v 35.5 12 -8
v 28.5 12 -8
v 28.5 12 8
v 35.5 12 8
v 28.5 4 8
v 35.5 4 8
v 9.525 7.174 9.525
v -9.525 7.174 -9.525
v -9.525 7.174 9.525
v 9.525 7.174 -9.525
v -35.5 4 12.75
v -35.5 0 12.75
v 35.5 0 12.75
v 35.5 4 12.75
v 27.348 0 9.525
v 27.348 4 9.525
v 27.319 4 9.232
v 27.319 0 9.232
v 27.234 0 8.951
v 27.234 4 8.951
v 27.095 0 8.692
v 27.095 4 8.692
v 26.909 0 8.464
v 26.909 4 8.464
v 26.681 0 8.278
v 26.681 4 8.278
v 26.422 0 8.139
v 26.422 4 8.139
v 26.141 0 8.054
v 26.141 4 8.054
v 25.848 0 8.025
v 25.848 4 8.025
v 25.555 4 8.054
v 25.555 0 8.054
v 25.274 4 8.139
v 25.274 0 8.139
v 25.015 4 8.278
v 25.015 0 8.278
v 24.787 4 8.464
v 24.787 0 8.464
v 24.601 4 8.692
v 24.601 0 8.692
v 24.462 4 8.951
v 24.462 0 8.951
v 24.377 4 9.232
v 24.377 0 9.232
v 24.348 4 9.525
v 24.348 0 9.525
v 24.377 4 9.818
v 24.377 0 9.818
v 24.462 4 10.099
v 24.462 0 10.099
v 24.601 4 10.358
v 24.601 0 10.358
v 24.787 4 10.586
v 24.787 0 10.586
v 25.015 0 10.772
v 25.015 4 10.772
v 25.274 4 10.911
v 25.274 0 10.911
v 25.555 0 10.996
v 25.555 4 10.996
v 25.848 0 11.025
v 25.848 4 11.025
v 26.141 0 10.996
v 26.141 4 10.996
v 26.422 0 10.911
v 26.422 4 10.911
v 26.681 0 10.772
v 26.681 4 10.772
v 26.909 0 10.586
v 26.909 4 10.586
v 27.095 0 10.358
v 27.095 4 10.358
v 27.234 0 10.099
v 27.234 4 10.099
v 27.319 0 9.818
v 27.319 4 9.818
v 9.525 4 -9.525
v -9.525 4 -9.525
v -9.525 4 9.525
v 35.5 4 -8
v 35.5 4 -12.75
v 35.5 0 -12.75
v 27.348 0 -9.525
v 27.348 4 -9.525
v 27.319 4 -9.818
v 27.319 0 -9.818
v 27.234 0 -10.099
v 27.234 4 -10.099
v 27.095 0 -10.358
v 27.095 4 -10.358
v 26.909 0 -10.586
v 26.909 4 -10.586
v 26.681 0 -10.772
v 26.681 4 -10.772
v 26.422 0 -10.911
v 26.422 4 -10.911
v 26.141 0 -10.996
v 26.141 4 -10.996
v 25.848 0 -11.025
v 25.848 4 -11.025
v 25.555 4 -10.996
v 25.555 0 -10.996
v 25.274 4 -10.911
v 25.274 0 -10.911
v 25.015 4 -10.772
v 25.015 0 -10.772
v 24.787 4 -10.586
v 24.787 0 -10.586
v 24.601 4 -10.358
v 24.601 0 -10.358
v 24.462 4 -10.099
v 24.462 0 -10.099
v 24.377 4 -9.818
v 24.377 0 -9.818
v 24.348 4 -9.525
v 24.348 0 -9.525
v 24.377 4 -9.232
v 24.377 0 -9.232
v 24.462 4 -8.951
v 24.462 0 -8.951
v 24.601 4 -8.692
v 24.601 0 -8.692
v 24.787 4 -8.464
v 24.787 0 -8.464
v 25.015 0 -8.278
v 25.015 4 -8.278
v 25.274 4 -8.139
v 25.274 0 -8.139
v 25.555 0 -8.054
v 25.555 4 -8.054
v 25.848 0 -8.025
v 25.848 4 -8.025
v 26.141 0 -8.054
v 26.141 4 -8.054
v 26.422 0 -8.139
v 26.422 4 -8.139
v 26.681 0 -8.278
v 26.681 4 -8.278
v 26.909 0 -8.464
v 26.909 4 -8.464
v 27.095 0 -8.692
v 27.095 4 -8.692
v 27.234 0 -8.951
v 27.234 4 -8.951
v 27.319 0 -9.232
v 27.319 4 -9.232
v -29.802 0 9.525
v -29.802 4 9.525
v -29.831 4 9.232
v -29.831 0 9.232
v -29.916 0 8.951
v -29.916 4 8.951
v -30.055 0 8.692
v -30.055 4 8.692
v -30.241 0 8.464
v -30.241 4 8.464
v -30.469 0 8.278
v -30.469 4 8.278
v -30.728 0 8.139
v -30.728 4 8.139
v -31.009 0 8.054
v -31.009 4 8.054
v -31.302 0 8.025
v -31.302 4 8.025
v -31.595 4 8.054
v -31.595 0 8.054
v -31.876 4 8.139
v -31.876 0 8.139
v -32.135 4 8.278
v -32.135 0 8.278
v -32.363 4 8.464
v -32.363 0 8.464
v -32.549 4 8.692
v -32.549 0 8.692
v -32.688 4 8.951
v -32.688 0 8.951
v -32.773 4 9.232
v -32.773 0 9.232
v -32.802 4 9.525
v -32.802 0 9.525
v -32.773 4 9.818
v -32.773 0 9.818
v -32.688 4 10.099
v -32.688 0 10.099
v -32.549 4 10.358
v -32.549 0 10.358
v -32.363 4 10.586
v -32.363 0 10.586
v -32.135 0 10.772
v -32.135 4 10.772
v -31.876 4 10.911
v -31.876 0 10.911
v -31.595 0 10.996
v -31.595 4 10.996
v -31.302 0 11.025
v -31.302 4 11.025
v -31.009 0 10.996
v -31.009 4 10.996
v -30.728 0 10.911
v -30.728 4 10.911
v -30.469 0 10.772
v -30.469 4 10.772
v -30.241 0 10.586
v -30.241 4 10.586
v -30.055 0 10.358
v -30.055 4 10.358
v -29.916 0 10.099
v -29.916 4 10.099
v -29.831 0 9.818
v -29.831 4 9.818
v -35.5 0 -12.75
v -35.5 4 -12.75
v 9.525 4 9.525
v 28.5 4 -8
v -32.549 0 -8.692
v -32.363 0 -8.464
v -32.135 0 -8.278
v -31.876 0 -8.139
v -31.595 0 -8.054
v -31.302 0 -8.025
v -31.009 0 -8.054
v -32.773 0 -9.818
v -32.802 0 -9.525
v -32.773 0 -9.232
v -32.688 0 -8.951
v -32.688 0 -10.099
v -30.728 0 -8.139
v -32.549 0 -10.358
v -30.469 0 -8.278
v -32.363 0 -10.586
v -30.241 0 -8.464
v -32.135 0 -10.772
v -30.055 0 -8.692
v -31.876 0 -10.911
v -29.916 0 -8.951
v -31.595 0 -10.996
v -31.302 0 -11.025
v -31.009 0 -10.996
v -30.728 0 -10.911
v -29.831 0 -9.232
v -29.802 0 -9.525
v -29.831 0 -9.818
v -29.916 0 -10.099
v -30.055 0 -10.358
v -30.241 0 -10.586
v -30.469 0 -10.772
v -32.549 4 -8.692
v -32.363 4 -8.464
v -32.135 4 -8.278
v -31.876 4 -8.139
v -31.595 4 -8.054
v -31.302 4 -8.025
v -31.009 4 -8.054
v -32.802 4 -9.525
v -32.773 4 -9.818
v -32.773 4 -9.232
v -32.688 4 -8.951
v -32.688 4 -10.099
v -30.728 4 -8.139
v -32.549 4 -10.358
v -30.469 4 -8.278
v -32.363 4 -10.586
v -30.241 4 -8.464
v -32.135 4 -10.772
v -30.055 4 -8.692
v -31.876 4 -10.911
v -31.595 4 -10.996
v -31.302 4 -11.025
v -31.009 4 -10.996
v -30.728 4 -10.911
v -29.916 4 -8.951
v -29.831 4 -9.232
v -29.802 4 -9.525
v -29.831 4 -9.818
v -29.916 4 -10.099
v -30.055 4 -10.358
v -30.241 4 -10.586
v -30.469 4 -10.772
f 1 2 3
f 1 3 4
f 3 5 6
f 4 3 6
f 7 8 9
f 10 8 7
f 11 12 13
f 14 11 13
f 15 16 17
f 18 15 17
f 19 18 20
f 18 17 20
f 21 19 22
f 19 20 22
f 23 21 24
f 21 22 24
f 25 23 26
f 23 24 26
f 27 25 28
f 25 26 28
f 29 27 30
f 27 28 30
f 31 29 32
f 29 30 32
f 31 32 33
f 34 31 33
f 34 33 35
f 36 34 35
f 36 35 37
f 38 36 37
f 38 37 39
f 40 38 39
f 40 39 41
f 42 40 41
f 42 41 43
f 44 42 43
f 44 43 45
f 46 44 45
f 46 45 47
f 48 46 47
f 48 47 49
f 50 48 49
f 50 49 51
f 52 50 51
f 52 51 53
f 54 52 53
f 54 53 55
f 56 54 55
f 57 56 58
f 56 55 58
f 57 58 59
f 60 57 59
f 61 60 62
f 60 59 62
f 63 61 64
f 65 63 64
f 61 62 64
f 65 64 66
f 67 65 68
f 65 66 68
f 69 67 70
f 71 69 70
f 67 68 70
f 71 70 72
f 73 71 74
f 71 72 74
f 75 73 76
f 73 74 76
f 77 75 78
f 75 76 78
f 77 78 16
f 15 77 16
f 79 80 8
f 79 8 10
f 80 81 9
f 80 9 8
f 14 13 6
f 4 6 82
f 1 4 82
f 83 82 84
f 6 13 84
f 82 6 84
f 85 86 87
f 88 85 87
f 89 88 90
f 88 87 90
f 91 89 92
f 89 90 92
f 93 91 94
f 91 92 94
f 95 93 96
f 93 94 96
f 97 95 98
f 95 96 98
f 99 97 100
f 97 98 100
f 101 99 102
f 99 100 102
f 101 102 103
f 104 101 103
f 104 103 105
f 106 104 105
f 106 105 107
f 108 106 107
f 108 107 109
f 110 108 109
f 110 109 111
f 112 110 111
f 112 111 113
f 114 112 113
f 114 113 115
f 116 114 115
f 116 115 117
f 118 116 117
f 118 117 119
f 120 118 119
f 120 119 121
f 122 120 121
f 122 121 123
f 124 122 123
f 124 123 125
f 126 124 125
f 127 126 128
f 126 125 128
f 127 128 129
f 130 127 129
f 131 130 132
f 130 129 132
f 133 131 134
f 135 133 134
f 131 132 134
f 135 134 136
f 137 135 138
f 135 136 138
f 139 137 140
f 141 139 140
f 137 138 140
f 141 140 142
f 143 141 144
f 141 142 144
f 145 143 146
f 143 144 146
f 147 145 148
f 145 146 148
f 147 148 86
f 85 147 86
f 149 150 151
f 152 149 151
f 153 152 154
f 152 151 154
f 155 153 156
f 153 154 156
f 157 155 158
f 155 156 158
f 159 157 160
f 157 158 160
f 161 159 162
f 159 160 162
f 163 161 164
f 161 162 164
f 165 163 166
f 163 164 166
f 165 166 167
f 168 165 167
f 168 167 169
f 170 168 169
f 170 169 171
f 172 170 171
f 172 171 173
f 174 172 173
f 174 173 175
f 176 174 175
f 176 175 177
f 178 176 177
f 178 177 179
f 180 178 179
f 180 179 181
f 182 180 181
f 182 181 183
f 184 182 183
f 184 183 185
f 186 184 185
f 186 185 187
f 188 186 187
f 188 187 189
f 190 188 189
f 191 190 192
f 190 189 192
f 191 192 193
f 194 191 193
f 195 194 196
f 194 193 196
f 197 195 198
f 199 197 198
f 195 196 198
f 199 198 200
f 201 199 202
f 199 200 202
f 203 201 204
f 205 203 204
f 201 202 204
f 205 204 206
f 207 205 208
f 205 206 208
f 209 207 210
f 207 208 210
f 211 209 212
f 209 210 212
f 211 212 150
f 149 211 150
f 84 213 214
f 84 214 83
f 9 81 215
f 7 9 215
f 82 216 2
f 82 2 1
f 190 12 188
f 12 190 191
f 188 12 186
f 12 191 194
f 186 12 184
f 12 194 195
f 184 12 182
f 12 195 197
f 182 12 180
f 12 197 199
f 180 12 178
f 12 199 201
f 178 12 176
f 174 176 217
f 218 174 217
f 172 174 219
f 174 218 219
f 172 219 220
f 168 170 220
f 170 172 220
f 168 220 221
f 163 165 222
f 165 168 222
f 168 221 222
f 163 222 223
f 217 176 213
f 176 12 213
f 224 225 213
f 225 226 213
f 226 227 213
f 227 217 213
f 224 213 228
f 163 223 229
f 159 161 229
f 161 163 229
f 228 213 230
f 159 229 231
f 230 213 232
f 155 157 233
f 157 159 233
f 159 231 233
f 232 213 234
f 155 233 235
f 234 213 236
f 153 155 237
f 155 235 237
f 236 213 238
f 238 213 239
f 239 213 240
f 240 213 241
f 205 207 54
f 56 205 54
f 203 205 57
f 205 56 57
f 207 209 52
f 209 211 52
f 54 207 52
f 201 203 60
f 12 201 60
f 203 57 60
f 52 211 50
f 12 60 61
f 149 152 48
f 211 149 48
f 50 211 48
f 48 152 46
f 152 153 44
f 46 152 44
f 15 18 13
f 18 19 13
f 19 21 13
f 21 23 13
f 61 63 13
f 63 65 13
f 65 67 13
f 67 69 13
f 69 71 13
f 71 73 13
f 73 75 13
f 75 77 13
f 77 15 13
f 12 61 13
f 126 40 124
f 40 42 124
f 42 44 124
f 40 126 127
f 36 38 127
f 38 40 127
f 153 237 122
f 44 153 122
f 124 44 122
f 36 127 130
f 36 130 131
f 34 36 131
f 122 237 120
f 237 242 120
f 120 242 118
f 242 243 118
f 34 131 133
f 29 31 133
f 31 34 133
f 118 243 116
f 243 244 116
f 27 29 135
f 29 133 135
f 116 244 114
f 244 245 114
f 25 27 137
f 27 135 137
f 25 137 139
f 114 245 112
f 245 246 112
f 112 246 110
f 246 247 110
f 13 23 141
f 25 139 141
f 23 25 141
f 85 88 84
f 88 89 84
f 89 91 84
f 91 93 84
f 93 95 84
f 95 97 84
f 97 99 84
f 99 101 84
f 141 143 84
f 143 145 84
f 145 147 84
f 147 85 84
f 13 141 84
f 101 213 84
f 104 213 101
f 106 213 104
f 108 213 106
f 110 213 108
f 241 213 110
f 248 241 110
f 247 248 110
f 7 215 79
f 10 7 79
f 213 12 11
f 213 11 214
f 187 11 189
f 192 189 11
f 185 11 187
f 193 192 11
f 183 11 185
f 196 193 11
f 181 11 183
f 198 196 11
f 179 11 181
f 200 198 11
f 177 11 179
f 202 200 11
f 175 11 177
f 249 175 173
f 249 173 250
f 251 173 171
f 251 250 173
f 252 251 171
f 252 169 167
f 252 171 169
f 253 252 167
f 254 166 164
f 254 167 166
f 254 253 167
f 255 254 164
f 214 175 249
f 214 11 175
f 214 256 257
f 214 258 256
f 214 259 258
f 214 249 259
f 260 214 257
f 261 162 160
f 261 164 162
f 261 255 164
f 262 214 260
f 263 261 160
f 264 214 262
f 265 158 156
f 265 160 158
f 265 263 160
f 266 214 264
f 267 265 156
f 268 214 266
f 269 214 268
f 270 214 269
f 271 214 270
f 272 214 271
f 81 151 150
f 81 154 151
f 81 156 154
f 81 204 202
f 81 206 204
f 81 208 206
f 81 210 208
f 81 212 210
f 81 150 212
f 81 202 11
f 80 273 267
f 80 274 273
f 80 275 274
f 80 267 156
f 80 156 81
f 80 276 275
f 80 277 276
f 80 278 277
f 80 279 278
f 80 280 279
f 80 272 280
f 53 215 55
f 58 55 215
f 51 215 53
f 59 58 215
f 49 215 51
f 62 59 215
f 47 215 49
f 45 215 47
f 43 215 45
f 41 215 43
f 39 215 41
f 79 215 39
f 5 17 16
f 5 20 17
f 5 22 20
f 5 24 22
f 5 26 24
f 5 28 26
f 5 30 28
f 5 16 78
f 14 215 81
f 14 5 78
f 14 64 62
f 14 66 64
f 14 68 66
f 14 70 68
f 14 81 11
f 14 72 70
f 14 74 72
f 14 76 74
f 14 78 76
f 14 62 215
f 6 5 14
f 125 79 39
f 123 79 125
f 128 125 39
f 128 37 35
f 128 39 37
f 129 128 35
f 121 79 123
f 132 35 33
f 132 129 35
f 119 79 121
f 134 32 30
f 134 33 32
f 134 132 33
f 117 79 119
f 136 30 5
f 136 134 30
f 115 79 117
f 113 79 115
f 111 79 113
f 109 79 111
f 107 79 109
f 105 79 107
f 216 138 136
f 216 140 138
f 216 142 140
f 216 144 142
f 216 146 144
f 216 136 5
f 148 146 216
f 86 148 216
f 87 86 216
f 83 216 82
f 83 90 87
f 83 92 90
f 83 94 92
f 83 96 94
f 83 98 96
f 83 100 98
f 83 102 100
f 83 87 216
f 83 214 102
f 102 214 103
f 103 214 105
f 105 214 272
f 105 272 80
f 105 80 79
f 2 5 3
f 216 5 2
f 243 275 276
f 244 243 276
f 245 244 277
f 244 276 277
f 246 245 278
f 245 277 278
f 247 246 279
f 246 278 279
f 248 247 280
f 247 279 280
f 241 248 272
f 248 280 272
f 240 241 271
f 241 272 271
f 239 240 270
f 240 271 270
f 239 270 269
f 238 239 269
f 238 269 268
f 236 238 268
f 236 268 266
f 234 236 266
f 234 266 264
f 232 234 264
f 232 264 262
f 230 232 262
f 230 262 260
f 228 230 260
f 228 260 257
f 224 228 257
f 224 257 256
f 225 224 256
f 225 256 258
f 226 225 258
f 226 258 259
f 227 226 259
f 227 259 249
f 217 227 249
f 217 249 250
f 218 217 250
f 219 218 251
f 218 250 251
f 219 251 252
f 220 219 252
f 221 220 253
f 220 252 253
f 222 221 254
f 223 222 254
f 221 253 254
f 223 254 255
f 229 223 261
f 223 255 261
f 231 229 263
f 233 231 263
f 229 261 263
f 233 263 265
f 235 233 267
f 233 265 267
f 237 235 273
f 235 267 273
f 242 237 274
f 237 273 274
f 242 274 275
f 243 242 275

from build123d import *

# Parameters (mm, degrees)
SKETCH1_W           = 71
SKETCH1_H           = 25.5
BOSS_EXTRUDE2_DEPTH = 4
SKETCH4_W           = 7
SKETCH4_H           = 16
BOSS_EXTRUDE3_DEPTH = 8
SKETCH5_W           = 19.05
SKETCH5_H           = 19.05
BOSS_EXTRUDE4_DEPTH = 3.174
SKETCH6_R           = 1.5
CUT_EXTRUDE1_DEPTH  = 5


with BuildPart() as part:
    # Sketch1 → Boss-Extrude2 (new body)
    with BuildSketch(Plane(origin=(0, 0, 0), x_dir=(1, 0, 0), z_dir=(0, 1, 0))):
        Rectangle(SKETCH1_W, SKETCH1_H)
    extrude(amount=BOSS_EXTRUDE2_DEPTH)

    # Sketch4 → Boss-Extrude3 (add)
    with BuildSketch(Plane(origin=(0, 4, 0), x_dir=(1, 0, 0), z_dir=(0, 1, 0))):
        with Locations((32, 0)):
            Rectangle(SKETCH4_W, SKETCH4_H)
    extrude(amount=BOSS_EXTRUDE3_DEPTH)

    # Sketch5 → Boss-Extrude4 (add)
    with BuildSketch(Plane(origin=(0, 4, 0), x_dir=(1, 0, 0), z_dir=(0, 1, 0))):
        Rectangle(SKETCH5_W, SKETCH5_H)
    extrude(amount=BOSS_EXTRUDE4_DEPTH)

    # Sketch6 → Cut-Extrude1 (cut, through all)
    with BuildSketch(Plane(origin=(0, 4, 0), x_dir=(1, 0, 0), z_dir=(0, 1, 0))):
        with Locations((-31.302, 9.525)):
            Circle(SKETCH6_R)
        with Locations((-31.302, -9.525)):
            Circle(SKETCH6_R)
        with Locations((25.848, 9.525)):
            Circle(SKETCH6_R)
        with Locations((25.848, -9.525)):
            Circle(SKETCH6_R)
    extrude(amount=-CUT_EXTRUDE1_DEPTH, mode=Mode.SUBTRACT)


solid = part.part
